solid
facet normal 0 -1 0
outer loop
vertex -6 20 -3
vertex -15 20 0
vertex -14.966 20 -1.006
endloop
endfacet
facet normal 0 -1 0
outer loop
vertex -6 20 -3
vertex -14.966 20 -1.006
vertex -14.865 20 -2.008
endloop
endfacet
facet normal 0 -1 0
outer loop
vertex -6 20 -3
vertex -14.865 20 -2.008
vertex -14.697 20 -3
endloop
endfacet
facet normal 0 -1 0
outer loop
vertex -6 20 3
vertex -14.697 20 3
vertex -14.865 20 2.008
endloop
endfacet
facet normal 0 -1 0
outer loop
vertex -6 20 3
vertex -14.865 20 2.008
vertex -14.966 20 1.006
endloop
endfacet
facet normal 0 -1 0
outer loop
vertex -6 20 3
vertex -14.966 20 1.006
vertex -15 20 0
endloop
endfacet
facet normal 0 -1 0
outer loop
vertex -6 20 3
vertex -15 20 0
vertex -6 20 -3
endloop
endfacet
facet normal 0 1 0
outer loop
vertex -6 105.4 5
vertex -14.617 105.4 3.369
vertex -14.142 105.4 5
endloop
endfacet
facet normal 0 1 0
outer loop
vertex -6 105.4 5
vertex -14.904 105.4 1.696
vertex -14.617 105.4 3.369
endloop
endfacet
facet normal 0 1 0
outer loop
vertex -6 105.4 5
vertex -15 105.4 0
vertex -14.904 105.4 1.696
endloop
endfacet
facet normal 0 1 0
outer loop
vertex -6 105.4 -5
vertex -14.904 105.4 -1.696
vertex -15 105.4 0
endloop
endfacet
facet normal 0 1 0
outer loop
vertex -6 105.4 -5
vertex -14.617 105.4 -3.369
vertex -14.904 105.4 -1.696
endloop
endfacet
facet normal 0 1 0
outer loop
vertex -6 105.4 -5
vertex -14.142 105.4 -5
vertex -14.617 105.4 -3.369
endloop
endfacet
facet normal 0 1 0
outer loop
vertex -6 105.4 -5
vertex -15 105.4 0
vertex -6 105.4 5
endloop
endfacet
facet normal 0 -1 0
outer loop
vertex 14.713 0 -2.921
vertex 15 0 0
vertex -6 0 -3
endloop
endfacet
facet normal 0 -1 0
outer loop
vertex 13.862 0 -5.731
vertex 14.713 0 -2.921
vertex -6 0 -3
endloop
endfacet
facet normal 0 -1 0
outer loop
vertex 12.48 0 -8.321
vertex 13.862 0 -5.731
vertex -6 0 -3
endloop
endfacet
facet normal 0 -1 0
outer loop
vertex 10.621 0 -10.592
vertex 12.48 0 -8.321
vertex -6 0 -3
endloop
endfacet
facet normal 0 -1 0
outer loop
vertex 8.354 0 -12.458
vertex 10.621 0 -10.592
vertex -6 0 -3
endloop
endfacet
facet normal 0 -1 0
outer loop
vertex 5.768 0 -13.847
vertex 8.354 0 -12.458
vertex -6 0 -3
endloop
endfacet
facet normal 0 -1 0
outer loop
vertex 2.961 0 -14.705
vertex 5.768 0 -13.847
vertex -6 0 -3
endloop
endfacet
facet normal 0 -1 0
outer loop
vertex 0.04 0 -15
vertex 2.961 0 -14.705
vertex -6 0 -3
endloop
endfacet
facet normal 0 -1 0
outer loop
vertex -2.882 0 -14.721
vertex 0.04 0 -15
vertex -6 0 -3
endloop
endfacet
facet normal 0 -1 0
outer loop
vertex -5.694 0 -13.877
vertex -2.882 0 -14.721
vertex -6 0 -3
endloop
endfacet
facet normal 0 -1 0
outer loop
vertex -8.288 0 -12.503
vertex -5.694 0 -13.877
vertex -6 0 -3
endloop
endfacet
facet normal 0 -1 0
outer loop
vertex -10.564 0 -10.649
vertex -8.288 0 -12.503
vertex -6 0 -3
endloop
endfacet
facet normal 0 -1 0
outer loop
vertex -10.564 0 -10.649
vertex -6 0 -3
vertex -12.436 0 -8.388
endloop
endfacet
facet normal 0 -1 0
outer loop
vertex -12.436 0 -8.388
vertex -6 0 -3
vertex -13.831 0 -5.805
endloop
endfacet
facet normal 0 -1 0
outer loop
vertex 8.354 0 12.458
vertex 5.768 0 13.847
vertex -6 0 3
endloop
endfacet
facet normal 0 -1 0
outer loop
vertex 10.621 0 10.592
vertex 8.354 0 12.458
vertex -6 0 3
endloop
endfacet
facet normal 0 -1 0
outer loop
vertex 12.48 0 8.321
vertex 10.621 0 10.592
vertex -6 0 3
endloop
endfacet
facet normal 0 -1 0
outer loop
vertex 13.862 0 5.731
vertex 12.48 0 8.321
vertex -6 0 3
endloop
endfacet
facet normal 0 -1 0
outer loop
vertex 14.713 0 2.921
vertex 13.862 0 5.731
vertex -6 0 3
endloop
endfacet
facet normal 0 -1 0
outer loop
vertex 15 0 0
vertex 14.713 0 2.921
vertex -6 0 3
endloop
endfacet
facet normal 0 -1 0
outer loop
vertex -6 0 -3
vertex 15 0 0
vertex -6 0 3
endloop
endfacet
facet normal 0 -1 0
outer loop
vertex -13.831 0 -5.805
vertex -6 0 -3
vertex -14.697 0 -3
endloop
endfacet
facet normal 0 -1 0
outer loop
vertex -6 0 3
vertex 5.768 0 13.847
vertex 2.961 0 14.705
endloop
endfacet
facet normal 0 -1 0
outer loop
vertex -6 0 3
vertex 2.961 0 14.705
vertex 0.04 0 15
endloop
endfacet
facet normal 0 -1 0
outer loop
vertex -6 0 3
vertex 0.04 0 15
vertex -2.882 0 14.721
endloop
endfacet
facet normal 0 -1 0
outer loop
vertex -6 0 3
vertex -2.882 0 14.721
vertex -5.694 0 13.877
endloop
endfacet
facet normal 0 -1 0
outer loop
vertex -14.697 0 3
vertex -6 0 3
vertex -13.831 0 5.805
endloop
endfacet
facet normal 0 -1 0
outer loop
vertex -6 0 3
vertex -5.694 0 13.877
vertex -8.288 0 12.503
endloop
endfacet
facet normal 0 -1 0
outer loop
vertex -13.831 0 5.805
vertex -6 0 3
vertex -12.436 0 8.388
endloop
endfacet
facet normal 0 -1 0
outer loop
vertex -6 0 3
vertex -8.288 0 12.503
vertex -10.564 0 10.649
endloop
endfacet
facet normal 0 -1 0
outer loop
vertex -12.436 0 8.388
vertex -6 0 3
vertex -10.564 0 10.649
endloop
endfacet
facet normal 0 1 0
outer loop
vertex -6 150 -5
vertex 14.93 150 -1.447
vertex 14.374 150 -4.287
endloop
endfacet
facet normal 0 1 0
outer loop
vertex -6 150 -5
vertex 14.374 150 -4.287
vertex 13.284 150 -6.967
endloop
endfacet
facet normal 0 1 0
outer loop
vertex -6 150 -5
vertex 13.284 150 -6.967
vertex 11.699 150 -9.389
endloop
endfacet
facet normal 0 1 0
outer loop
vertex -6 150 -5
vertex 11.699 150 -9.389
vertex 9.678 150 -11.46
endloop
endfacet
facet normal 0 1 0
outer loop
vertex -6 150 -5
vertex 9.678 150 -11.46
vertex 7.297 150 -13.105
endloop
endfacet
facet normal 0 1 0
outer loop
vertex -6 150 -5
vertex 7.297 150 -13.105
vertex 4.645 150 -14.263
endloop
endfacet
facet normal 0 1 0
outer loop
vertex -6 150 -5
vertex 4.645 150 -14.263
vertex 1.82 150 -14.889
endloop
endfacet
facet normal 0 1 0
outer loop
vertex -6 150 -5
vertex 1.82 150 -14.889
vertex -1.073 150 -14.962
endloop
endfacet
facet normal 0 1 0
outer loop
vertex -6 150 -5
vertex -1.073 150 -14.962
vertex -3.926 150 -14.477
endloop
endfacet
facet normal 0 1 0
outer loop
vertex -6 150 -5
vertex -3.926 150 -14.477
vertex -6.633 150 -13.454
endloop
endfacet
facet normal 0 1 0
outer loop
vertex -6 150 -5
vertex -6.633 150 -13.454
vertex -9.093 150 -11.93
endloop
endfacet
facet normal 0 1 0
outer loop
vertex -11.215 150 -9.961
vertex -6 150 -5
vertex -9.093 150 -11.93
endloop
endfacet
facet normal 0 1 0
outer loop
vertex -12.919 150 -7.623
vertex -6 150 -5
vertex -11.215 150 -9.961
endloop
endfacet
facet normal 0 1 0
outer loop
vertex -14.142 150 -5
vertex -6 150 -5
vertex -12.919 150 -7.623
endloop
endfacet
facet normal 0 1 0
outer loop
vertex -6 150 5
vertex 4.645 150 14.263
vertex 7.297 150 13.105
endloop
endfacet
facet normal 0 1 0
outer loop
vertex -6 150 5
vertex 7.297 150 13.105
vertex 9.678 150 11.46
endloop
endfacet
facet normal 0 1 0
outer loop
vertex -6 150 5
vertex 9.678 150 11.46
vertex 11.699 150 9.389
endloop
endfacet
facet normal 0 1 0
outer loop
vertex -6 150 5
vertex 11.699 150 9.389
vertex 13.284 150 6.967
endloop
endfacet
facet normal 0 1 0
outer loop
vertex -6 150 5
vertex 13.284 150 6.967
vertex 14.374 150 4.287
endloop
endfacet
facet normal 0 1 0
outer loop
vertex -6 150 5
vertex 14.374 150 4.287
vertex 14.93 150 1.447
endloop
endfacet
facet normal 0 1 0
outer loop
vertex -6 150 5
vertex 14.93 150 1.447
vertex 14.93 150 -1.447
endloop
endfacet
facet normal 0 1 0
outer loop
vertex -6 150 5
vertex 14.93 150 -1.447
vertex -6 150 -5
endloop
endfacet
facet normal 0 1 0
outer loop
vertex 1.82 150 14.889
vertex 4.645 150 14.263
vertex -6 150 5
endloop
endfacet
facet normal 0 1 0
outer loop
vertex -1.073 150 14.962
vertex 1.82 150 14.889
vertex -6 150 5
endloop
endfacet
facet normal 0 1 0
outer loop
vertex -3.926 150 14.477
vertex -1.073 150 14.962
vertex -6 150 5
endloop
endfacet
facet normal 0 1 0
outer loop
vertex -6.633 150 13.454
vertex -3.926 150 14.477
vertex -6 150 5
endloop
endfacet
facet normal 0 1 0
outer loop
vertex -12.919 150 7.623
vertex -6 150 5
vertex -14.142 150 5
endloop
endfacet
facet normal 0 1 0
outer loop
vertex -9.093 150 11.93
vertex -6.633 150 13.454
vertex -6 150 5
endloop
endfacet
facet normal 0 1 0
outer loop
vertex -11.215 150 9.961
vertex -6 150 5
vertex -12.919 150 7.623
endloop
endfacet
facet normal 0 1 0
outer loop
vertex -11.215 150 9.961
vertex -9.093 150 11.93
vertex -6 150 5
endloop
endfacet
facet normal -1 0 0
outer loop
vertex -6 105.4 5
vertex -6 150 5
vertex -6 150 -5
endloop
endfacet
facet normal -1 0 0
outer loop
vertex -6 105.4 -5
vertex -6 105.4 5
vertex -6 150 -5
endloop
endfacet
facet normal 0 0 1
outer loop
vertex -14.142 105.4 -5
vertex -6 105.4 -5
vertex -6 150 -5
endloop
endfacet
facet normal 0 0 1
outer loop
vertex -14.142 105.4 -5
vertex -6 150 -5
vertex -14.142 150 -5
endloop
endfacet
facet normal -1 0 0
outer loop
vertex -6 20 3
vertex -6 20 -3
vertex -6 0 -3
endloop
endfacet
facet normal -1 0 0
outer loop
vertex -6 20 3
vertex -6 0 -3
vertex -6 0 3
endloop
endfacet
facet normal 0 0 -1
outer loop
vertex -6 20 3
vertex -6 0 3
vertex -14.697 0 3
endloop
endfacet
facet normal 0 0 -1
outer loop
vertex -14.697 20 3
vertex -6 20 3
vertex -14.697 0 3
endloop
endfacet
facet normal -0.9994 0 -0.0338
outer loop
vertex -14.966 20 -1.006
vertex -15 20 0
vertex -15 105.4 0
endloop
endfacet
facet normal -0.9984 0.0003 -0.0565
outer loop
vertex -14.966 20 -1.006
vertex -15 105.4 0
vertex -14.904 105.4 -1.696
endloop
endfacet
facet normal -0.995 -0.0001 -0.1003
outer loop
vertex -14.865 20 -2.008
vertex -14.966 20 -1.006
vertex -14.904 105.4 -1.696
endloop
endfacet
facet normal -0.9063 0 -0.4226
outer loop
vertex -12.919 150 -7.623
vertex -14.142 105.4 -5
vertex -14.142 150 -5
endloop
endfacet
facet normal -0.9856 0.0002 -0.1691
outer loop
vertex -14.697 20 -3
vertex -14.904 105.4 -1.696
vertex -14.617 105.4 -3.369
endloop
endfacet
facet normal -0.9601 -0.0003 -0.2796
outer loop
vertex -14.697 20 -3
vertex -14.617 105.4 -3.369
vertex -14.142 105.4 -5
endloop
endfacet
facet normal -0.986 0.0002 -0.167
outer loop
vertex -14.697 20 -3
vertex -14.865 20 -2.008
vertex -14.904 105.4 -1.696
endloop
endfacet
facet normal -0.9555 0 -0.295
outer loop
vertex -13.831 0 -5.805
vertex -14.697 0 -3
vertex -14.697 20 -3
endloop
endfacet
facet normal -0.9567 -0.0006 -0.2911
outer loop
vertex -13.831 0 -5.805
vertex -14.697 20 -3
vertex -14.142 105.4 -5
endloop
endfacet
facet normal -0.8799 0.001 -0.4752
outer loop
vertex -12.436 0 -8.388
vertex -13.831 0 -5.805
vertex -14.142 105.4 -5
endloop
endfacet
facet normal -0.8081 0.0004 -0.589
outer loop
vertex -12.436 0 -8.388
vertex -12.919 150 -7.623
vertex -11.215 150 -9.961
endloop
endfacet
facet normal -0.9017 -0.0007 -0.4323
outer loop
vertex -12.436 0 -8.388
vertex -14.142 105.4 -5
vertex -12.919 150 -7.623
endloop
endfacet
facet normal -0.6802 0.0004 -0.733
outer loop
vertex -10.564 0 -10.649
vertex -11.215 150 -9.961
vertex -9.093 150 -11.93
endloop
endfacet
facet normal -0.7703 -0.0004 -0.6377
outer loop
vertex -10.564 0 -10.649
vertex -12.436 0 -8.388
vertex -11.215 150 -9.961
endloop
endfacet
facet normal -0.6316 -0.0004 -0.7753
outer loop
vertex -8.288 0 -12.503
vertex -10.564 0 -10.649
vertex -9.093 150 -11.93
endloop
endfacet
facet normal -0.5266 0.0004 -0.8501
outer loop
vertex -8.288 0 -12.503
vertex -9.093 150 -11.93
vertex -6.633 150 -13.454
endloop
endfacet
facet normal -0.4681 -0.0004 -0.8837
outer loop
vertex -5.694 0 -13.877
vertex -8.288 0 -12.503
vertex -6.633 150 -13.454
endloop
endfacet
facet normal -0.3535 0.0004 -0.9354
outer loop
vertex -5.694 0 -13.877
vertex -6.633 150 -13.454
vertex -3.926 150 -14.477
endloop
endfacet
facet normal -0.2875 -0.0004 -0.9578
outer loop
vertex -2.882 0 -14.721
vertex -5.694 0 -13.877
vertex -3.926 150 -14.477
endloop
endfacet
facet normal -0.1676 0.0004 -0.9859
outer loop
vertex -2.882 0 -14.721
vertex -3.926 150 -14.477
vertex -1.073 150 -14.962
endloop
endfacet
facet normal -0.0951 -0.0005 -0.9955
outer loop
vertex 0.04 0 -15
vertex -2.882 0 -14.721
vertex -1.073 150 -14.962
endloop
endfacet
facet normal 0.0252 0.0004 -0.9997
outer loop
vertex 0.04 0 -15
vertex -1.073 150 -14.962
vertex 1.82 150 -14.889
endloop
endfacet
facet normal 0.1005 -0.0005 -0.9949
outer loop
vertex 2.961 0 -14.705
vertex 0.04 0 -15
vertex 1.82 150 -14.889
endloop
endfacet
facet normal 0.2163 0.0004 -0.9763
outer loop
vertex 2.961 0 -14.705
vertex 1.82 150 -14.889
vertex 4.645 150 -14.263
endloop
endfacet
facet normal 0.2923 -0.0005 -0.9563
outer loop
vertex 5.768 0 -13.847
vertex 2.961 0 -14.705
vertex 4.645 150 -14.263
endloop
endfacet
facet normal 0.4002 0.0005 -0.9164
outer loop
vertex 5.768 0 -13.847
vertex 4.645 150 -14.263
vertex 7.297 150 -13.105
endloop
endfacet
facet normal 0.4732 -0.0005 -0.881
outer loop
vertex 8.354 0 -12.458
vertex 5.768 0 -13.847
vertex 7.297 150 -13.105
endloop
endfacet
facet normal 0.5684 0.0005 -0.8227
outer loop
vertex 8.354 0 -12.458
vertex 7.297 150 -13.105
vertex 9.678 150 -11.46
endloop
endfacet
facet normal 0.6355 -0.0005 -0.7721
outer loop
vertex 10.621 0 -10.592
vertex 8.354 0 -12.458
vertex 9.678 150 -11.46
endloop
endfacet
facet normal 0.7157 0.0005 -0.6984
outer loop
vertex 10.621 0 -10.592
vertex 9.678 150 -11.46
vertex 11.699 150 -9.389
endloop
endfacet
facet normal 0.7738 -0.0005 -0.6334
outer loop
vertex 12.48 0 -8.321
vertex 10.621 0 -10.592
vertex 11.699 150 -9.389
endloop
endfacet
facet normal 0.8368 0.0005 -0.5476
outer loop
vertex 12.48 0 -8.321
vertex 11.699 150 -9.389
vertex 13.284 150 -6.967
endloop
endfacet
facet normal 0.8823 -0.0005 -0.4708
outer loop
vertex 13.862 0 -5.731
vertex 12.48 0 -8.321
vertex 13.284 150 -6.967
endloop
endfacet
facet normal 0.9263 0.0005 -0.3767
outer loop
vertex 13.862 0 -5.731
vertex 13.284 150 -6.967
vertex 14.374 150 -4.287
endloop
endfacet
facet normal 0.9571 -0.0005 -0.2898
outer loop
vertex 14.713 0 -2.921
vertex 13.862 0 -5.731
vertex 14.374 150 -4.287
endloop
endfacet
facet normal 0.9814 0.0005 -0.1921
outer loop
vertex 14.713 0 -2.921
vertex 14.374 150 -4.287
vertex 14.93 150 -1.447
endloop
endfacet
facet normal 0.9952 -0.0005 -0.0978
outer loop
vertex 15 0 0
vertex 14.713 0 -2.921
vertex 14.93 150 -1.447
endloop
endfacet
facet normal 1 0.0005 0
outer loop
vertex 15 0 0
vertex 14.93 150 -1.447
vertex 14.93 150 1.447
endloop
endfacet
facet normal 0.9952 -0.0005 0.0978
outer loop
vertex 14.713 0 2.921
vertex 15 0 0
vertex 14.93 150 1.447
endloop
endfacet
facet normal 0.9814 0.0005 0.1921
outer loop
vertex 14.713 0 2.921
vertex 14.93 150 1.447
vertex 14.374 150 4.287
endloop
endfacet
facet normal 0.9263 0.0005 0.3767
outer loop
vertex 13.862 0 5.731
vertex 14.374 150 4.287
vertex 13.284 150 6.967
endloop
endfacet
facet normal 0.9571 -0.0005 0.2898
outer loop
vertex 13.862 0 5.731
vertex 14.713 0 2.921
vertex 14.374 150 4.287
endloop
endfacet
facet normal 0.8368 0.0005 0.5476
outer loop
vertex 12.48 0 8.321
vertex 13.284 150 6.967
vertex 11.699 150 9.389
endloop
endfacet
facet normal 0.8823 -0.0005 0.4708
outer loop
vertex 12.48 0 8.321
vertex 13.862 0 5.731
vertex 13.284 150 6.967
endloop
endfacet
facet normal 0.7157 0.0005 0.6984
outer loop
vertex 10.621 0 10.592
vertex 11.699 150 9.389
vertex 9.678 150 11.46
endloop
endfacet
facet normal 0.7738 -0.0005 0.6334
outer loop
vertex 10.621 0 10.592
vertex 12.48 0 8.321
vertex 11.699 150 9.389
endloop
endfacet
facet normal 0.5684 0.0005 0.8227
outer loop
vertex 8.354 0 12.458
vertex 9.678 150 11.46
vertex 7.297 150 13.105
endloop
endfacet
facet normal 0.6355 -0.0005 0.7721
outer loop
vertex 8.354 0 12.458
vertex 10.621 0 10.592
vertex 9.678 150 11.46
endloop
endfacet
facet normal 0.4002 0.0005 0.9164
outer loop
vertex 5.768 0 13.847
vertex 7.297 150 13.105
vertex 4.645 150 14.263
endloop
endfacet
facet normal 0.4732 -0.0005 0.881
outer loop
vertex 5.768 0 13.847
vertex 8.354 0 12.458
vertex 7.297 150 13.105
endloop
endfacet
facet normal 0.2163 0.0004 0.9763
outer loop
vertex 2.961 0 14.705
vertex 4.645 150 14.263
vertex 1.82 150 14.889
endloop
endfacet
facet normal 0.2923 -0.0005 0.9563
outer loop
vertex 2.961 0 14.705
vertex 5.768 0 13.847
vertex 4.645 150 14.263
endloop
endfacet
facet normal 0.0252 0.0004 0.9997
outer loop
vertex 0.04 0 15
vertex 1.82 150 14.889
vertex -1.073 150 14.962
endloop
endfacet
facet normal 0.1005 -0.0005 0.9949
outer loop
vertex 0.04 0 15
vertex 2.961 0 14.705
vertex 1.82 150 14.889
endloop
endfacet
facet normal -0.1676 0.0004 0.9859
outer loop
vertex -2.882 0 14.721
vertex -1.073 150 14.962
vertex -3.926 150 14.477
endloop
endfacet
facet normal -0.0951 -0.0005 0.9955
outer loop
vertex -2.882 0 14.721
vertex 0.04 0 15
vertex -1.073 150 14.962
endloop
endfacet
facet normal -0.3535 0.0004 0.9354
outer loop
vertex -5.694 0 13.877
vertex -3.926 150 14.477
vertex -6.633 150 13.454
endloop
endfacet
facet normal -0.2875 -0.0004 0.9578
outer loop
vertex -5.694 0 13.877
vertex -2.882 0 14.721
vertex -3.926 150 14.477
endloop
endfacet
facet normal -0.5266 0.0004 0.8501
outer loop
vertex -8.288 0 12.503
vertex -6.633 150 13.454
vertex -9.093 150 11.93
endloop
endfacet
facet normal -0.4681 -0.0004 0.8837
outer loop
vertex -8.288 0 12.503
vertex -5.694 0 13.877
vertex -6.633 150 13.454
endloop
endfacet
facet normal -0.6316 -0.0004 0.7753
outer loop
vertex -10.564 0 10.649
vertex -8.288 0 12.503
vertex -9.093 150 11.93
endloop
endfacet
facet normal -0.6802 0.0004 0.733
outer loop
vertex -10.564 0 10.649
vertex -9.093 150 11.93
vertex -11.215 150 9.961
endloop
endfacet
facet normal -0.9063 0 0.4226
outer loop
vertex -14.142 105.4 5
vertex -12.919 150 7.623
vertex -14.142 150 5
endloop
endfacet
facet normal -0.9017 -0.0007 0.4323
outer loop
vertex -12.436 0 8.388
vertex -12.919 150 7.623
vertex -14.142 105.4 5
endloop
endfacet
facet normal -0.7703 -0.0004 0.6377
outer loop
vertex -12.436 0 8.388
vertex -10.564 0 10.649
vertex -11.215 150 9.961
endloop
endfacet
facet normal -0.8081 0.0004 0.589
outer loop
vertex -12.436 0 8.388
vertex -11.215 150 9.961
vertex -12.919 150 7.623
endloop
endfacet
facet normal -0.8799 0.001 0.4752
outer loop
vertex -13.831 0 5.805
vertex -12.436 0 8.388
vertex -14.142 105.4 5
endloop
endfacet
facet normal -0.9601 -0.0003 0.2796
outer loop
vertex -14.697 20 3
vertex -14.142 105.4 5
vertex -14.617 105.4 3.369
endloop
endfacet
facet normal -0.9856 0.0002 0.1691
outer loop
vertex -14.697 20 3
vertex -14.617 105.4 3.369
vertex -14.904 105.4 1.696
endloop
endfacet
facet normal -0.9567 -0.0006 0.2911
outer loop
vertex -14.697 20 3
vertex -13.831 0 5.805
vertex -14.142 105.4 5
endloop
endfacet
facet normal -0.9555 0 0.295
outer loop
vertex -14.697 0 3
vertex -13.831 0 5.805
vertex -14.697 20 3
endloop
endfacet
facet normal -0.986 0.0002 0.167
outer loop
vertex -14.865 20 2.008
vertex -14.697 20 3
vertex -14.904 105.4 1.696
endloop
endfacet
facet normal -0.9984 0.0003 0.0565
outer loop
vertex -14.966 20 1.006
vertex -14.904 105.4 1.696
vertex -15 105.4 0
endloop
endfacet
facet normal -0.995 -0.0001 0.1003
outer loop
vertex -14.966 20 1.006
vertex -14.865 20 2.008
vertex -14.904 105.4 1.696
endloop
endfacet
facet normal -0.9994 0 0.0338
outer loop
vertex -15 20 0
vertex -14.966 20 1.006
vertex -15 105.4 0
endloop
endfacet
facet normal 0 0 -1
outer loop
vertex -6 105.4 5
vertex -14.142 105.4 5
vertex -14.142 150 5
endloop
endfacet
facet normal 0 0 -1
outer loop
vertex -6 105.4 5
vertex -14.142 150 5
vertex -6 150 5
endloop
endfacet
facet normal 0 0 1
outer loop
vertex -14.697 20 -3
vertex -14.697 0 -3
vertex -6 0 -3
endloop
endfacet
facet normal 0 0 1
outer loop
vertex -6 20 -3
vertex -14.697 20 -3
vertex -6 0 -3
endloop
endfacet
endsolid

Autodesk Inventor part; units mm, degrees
ref_plane "YZ Plane" through (0, 0, 0) normal (1, 0, 0) x (0, 1, 0)
ref_plane "XZ Plane" through (0, 0, 0) normal (0, 1, 0) x (-1, 0, 0)
ref_plane "XY Plane" through (0, 0, 0) normal (0, 0, 1) x (1, 0, 0)
sketch "Skizze1" plane through (0, 0, 0) normal (0, 1, 0) x (-1, 0, 0)
  circle A0 centre (0, 0) radius 15
  dimension "d0" = 30
extrude "Extrusion1" add sketch "Skizze1" along normal blind 150
sketch "Skizze2" plane through (0, 150, 0) normal (0, 1, 0) x (1, 0, 0)
  line L0 (-16, -5) -> (-6, -5)
  line L1 (-6, -5) -> (-6, 5)
  line L2 (-6, 5) -> (-16, 5)
  line L3 (-16, 5) -> (-16, -5)
  line L4 (-22.2, 0) -> (21.2, 0) construction
  line L5 (0, 21) -> (0, -21) construction
  dimension "d3" = 6
  dimension "d4" = 10
  dimension "d5" = 10
extrude "Extrusion2" cut sketch "Skizze2" against normal blind 44.6
sketch "Skizze3" plane through (0, 0, 0) normal (0, -1, 0) x (1, 0, 0)
  line L0 (-18, -3) -> (-6, -3)
  line L1 (-6, -3) -> (-6, 3)
  line L2 (-6, 3) -> (-18, 3)
  line L3 (-18, 3) -> (-18, -3)
  line L4 (-24.6, 0) -> (21.6, 0) construction
  line L5 (0, -21) -> (0, 21) construction
  dimension "d8" = 6
  dimension "d9" = 12
  dimension "d10" = 6
extrude "Extrusion3" cut sketch "Skizze3" against normal blind 20
properties part number "Welle_000"
